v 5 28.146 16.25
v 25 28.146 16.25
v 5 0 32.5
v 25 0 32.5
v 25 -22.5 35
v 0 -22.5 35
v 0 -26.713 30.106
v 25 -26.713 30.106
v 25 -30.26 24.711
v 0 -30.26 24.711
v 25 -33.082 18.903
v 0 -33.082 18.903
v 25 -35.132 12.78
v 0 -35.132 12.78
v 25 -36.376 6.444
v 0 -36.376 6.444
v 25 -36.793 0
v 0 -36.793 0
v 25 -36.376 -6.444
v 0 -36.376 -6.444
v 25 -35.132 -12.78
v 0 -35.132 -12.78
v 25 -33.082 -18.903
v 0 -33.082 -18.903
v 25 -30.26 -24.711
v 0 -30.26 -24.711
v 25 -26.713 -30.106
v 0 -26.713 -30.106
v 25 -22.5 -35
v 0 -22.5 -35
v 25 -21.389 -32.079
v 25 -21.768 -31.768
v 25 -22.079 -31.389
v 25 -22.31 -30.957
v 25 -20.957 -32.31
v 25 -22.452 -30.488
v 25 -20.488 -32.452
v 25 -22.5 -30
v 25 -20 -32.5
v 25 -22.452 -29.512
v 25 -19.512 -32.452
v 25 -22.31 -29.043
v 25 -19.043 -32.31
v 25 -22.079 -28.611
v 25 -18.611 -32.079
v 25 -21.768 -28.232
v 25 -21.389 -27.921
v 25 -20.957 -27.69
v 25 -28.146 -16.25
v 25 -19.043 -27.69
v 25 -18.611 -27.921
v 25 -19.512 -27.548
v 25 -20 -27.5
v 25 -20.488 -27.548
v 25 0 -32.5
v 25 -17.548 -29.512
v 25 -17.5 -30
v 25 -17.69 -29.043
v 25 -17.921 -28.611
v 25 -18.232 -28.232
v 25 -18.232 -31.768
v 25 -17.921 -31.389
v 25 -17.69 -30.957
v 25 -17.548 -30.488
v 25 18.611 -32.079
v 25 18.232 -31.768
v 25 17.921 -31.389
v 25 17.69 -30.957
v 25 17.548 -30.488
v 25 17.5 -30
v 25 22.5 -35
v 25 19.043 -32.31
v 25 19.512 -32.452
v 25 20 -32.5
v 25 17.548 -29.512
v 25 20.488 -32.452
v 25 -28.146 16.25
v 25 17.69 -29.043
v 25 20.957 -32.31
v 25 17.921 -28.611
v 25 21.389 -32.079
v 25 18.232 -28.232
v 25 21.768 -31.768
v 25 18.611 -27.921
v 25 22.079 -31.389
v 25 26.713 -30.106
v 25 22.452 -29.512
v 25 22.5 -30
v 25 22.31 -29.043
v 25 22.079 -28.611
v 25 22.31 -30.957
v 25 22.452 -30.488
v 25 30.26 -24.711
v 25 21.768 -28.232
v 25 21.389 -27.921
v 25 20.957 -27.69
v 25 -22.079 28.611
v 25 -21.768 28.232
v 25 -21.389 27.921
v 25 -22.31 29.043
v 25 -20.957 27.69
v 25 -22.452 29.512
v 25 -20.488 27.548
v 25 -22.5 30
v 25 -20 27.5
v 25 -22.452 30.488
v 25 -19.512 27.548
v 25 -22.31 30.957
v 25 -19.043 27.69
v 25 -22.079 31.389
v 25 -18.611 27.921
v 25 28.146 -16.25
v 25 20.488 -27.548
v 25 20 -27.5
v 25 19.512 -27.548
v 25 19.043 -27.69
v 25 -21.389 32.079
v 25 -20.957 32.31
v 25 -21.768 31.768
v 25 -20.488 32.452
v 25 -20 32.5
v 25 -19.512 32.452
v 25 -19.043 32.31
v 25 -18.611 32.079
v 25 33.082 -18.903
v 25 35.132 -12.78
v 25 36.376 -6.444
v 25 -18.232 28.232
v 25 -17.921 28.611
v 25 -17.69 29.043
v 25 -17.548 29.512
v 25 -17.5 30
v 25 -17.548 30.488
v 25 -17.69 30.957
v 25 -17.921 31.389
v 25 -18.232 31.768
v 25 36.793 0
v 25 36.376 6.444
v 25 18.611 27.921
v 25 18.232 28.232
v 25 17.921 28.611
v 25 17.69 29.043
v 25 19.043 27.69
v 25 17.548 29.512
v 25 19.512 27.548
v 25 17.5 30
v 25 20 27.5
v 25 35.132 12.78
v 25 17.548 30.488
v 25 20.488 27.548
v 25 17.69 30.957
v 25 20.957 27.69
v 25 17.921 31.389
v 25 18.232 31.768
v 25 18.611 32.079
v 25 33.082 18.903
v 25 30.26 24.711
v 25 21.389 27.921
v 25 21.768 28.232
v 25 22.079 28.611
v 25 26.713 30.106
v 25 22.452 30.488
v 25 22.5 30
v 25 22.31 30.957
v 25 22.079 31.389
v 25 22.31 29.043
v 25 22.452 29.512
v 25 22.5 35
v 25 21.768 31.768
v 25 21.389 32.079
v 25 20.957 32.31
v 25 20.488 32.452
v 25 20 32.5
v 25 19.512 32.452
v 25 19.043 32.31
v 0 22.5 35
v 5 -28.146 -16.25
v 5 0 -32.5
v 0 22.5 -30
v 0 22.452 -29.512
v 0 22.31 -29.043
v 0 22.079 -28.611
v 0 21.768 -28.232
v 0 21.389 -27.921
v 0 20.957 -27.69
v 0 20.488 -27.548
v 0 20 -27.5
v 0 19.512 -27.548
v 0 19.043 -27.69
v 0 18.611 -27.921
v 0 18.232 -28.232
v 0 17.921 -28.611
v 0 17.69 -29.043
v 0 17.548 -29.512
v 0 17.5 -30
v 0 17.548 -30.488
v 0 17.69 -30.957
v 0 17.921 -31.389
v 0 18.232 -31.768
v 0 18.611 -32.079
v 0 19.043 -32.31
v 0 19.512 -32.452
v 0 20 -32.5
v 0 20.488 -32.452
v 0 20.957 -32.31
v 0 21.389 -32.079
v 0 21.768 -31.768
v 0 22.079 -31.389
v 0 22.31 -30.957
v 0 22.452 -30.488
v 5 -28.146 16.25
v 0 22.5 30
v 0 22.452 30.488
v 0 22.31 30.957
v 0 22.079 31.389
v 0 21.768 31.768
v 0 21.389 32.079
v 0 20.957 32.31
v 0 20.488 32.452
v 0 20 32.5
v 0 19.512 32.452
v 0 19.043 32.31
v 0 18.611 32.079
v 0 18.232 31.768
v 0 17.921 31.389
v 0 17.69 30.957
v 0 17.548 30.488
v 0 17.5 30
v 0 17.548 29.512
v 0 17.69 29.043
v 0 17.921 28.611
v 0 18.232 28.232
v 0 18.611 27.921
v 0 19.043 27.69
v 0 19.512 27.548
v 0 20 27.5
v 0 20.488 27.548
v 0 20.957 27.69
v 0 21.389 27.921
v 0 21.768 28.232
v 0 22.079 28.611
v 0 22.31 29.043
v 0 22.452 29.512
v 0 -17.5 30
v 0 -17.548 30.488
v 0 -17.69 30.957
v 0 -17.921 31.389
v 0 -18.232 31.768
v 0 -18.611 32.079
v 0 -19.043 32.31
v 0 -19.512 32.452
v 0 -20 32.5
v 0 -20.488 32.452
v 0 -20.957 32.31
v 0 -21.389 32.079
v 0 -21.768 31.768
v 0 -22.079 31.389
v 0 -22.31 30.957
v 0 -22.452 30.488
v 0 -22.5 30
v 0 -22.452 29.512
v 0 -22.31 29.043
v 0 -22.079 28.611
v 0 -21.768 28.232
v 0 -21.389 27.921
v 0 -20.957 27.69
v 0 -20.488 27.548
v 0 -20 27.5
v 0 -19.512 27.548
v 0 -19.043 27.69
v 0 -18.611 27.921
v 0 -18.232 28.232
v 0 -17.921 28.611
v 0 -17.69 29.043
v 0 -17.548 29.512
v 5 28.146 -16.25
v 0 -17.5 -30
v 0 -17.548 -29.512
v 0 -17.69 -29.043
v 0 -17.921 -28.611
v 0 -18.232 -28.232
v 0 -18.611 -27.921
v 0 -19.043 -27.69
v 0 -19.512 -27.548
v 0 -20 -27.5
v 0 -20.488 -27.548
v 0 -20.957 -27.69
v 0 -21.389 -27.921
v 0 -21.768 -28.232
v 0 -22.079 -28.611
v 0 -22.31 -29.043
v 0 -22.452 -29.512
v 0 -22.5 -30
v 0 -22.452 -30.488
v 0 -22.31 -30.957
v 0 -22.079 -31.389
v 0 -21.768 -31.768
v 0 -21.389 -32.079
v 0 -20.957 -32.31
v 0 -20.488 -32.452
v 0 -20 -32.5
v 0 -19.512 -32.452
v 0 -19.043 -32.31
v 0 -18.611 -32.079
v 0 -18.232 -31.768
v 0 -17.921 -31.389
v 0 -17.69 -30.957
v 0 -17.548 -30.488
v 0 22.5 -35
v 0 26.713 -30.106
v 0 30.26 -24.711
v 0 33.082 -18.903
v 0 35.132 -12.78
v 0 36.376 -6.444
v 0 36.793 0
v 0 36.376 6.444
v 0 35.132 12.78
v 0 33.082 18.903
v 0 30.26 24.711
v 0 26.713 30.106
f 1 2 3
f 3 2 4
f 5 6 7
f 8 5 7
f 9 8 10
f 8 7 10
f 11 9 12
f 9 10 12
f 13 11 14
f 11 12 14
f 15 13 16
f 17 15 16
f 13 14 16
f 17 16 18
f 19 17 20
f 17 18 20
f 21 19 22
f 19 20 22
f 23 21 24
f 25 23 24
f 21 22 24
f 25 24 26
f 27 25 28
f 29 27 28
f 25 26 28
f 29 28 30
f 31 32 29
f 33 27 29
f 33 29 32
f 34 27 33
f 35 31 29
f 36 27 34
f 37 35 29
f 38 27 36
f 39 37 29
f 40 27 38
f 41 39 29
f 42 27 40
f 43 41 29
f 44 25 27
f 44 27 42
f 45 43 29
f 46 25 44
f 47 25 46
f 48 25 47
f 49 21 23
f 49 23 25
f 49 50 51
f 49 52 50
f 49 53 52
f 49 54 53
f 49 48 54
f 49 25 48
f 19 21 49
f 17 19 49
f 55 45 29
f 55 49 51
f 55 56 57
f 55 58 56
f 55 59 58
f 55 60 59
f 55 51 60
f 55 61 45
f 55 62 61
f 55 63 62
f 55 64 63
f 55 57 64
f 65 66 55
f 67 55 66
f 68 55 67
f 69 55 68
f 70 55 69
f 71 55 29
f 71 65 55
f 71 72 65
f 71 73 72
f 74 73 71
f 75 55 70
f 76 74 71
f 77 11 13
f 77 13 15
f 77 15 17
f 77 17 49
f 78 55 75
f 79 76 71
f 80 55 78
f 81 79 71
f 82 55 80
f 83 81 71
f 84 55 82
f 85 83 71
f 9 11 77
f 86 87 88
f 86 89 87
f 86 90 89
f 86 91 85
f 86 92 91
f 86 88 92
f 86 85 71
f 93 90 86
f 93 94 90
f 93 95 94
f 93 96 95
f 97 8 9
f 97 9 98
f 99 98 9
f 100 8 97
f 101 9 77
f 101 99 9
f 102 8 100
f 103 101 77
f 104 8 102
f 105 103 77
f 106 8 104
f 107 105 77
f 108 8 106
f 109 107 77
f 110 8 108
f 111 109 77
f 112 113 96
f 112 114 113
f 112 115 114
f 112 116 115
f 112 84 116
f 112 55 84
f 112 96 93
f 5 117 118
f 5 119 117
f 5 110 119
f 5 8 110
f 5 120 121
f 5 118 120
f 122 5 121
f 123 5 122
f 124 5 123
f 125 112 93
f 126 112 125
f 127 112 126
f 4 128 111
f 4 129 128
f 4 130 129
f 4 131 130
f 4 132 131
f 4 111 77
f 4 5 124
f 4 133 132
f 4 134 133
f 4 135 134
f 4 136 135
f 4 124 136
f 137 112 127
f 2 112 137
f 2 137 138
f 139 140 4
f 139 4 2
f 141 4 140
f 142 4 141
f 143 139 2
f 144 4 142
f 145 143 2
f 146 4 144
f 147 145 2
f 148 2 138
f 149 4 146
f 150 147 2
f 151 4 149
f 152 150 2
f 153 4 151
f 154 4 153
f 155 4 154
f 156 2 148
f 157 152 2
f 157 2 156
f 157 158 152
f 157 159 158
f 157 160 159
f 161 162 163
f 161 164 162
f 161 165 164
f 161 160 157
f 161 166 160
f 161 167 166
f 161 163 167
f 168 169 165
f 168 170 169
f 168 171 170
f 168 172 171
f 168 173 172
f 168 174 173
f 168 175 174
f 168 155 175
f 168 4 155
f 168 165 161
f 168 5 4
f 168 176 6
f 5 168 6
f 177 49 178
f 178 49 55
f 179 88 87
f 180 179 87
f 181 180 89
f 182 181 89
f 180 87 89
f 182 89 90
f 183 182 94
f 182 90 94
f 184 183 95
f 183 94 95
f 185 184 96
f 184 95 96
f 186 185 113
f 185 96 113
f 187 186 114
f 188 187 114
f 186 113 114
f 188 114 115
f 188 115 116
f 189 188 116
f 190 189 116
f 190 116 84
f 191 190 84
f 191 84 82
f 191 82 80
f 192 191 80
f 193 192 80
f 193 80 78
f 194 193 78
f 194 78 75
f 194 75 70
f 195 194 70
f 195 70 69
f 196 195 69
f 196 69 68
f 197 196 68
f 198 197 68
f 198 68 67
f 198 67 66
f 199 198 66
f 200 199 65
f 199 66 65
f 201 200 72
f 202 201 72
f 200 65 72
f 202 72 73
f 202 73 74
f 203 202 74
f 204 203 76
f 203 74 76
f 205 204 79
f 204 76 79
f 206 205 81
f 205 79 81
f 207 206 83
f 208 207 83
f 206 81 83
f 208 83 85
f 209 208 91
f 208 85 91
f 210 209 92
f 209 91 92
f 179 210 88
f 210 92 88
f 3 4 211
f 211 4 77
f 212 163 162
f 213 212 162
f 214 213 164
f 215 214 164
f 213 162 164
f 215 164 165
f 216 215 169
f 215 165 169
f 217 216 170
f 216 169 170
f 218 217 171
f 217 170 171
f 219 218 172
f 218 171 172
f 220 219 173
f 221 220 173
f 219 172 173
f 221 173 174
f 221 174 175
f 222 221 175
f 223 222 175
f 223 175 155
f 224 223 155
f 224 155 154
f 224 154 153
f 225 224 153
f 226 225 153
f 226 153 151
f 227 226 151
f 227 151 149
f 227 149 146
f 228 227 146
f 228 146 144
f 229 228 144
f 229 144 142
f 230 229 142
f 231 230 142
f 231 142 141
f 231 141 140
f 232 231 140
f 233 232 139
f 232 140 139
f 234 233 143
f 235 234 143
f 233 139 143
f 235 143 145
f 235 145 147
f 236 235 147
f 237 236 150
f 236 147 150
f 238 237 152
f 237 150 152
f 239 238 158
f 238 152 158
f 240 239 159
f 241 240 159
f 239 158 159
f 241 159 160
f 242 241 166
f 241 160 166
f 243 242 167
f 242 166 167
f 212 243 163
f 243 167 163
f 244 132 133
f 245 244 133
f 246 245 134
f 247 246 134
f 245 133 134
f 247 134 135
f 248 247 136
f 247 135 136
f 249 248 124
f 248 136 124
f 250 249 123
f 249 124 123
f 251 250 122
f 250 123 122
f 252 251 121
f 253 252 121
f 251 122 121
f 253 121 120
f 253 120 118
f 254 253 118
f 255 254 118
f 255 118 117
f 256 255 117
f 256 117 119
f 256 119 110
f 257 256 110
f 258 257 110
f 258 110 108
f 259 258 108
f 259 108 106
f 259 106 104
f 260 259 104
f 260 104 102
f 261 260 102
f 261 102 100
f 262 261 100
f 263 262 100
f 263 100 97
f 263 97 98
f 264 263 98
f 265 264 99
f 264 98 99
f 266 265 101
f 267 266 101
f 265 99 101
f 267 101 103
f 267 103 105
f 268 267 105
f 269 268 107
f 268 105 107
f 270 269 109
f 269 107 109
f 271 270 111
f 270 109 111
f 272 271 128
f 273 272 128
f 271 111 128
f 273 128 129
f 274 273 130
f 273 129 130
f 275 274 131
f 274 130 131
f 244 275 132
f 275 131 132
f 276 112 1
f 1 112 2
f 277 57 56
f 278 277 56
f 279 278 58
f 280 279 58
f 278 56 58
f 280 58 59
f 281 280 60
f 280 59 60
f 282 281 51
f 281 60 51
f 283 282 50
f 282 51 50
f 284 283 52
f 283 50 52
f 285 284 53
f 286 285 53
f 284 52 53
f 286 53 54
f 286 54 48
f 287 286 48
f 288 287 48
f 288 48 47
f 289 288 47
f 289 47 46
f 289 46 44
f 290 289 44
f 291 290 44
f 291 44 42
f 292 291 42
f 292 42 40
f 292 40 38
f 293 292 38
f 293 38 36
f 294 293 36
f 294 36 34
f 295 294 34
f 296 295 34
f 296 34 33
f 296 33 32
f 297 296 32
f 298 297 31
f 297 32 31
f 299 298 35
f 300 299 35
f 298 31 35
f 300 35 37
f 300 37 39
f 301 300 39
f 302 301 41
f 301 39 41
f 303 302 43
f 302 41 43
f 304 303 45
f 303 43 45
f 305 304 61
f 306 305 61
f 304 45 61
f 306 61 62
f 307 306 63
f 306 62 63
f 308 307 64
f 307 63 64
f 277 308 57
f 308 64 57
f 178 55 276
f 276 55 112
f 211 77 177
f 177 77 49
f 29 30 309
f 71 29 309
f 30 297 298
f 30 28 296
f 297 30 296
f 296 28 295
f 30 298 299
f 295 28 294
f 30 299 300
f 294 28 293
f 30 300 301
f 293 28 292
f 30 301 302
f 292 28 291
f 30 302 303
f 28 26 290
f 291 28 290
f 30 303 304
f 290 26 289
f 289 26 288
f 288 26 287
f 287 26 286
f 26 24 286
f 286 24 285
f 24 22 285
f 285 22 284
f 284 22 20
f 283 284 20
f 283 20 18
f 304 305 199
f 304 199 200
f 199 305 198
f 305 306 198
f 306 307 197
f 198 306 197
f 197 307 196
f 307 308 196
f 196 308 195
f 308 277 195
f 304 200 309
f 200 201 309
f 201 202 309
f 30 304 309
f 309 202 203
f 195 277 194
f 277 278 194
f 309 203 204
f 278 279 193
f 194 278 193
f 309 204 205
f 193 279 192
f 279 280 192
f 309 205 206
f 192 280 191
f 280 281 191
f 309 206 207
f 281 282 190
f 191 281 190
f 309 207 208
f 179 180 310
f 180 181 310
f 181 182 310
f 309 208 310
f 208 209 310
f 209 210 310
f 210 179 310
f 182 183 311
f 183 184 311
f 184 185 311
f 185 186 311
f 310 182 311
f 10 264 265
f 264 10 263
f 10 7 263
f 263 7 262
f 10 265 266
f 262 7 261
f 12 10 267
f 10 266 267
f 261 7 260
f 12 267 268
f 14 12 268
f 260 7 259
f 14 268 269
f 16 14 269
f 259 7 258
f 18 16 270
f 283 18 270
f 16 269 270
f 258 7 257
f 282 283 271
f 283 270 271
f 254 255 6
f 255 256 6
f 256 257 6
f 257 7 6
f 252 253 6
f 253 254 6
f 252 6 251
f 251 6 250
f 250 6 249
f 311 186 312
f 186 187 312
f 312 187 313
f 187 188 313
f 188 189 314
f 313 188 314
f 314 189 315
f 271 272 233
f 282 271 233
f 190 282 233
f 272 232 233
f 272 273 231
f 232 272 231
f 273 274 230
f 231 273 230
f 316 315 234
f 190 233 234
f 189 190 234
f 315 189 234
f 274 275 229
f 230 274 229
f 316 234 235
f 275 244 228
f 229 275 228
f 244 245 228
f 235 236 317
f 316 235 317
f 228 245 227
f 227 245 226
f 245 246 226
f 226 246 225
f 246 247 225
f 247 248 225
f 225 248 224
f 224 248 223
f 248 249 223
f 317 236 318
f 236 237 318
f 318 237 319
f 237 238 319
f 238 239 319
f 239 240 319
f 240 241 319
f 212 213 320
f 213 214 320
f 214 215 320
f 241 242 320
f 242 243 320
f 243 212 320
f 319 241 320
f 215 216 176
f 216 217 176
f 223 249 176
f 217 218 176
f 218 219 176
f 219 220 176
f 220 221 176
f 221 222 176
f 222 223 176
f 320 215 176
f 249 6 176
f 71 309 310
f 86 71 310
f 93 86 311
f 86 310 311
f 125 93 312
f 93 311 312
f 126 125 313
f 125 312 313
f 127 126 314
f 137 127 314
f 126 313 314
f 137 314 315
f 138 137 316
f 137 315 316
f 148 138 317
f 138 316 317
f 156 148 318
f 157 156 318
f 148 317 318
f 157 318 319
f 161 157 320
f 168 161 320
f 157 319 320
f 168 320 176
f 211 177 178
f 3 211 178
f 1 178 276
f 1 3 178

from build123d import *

# Parameters (mm, degrees)
F1_DEPTH = 25
F3_DEPTH = 20
F4_R     = 2.5
F5_DEPTH = 25.001


with BuildPart() as f1:
    # F0 (on Right) → F1 (new body)
    with BuildSketch(Plane.YZ):
        with BuildLine():
            Line((-22.5, -35), (22.5, -35))
            ThreePointArc((22.5, -35), (36.792858, 0), (22.5, 35))
            Line((22.5, 35), (-22.5, 35))
            ThreePointArc((-22.5, 35), (-36.792858, 0), (-22.5, -35))
        make_face()
    extrude(amount=F1_DEPTH)

    # F2 (on face) → F3 (cut)
    with BuildSketch(Plane.YZ.offset(25)):
        Polygon((28.145826, -16.25), (28.145826, 16.25), (0, 32.5), (-28.145826, 16.25), (-28.145826, -16.25), (0, -32.5), align=None)
    extrude(amount=-F3_DEPTH, mode=Mode.SUBTRACT)

    # F4 (on face) → F5 (cut, through all)
    with BuildSketch(Plane.YZ.offset(25)):
        with Locations((-20, 30)):
            Circle(F4_R)
        with Locations((20, 30)):
            Circle(F4_R)
        with Locations((20, -30)):
            Circle(F4_R)
        with Locations((-20, -30)):
            Circle(F4_R)
    extrude(amount=-F5_DEPTH, mode=Mode.SUBTRACT)


solid = f1.part
